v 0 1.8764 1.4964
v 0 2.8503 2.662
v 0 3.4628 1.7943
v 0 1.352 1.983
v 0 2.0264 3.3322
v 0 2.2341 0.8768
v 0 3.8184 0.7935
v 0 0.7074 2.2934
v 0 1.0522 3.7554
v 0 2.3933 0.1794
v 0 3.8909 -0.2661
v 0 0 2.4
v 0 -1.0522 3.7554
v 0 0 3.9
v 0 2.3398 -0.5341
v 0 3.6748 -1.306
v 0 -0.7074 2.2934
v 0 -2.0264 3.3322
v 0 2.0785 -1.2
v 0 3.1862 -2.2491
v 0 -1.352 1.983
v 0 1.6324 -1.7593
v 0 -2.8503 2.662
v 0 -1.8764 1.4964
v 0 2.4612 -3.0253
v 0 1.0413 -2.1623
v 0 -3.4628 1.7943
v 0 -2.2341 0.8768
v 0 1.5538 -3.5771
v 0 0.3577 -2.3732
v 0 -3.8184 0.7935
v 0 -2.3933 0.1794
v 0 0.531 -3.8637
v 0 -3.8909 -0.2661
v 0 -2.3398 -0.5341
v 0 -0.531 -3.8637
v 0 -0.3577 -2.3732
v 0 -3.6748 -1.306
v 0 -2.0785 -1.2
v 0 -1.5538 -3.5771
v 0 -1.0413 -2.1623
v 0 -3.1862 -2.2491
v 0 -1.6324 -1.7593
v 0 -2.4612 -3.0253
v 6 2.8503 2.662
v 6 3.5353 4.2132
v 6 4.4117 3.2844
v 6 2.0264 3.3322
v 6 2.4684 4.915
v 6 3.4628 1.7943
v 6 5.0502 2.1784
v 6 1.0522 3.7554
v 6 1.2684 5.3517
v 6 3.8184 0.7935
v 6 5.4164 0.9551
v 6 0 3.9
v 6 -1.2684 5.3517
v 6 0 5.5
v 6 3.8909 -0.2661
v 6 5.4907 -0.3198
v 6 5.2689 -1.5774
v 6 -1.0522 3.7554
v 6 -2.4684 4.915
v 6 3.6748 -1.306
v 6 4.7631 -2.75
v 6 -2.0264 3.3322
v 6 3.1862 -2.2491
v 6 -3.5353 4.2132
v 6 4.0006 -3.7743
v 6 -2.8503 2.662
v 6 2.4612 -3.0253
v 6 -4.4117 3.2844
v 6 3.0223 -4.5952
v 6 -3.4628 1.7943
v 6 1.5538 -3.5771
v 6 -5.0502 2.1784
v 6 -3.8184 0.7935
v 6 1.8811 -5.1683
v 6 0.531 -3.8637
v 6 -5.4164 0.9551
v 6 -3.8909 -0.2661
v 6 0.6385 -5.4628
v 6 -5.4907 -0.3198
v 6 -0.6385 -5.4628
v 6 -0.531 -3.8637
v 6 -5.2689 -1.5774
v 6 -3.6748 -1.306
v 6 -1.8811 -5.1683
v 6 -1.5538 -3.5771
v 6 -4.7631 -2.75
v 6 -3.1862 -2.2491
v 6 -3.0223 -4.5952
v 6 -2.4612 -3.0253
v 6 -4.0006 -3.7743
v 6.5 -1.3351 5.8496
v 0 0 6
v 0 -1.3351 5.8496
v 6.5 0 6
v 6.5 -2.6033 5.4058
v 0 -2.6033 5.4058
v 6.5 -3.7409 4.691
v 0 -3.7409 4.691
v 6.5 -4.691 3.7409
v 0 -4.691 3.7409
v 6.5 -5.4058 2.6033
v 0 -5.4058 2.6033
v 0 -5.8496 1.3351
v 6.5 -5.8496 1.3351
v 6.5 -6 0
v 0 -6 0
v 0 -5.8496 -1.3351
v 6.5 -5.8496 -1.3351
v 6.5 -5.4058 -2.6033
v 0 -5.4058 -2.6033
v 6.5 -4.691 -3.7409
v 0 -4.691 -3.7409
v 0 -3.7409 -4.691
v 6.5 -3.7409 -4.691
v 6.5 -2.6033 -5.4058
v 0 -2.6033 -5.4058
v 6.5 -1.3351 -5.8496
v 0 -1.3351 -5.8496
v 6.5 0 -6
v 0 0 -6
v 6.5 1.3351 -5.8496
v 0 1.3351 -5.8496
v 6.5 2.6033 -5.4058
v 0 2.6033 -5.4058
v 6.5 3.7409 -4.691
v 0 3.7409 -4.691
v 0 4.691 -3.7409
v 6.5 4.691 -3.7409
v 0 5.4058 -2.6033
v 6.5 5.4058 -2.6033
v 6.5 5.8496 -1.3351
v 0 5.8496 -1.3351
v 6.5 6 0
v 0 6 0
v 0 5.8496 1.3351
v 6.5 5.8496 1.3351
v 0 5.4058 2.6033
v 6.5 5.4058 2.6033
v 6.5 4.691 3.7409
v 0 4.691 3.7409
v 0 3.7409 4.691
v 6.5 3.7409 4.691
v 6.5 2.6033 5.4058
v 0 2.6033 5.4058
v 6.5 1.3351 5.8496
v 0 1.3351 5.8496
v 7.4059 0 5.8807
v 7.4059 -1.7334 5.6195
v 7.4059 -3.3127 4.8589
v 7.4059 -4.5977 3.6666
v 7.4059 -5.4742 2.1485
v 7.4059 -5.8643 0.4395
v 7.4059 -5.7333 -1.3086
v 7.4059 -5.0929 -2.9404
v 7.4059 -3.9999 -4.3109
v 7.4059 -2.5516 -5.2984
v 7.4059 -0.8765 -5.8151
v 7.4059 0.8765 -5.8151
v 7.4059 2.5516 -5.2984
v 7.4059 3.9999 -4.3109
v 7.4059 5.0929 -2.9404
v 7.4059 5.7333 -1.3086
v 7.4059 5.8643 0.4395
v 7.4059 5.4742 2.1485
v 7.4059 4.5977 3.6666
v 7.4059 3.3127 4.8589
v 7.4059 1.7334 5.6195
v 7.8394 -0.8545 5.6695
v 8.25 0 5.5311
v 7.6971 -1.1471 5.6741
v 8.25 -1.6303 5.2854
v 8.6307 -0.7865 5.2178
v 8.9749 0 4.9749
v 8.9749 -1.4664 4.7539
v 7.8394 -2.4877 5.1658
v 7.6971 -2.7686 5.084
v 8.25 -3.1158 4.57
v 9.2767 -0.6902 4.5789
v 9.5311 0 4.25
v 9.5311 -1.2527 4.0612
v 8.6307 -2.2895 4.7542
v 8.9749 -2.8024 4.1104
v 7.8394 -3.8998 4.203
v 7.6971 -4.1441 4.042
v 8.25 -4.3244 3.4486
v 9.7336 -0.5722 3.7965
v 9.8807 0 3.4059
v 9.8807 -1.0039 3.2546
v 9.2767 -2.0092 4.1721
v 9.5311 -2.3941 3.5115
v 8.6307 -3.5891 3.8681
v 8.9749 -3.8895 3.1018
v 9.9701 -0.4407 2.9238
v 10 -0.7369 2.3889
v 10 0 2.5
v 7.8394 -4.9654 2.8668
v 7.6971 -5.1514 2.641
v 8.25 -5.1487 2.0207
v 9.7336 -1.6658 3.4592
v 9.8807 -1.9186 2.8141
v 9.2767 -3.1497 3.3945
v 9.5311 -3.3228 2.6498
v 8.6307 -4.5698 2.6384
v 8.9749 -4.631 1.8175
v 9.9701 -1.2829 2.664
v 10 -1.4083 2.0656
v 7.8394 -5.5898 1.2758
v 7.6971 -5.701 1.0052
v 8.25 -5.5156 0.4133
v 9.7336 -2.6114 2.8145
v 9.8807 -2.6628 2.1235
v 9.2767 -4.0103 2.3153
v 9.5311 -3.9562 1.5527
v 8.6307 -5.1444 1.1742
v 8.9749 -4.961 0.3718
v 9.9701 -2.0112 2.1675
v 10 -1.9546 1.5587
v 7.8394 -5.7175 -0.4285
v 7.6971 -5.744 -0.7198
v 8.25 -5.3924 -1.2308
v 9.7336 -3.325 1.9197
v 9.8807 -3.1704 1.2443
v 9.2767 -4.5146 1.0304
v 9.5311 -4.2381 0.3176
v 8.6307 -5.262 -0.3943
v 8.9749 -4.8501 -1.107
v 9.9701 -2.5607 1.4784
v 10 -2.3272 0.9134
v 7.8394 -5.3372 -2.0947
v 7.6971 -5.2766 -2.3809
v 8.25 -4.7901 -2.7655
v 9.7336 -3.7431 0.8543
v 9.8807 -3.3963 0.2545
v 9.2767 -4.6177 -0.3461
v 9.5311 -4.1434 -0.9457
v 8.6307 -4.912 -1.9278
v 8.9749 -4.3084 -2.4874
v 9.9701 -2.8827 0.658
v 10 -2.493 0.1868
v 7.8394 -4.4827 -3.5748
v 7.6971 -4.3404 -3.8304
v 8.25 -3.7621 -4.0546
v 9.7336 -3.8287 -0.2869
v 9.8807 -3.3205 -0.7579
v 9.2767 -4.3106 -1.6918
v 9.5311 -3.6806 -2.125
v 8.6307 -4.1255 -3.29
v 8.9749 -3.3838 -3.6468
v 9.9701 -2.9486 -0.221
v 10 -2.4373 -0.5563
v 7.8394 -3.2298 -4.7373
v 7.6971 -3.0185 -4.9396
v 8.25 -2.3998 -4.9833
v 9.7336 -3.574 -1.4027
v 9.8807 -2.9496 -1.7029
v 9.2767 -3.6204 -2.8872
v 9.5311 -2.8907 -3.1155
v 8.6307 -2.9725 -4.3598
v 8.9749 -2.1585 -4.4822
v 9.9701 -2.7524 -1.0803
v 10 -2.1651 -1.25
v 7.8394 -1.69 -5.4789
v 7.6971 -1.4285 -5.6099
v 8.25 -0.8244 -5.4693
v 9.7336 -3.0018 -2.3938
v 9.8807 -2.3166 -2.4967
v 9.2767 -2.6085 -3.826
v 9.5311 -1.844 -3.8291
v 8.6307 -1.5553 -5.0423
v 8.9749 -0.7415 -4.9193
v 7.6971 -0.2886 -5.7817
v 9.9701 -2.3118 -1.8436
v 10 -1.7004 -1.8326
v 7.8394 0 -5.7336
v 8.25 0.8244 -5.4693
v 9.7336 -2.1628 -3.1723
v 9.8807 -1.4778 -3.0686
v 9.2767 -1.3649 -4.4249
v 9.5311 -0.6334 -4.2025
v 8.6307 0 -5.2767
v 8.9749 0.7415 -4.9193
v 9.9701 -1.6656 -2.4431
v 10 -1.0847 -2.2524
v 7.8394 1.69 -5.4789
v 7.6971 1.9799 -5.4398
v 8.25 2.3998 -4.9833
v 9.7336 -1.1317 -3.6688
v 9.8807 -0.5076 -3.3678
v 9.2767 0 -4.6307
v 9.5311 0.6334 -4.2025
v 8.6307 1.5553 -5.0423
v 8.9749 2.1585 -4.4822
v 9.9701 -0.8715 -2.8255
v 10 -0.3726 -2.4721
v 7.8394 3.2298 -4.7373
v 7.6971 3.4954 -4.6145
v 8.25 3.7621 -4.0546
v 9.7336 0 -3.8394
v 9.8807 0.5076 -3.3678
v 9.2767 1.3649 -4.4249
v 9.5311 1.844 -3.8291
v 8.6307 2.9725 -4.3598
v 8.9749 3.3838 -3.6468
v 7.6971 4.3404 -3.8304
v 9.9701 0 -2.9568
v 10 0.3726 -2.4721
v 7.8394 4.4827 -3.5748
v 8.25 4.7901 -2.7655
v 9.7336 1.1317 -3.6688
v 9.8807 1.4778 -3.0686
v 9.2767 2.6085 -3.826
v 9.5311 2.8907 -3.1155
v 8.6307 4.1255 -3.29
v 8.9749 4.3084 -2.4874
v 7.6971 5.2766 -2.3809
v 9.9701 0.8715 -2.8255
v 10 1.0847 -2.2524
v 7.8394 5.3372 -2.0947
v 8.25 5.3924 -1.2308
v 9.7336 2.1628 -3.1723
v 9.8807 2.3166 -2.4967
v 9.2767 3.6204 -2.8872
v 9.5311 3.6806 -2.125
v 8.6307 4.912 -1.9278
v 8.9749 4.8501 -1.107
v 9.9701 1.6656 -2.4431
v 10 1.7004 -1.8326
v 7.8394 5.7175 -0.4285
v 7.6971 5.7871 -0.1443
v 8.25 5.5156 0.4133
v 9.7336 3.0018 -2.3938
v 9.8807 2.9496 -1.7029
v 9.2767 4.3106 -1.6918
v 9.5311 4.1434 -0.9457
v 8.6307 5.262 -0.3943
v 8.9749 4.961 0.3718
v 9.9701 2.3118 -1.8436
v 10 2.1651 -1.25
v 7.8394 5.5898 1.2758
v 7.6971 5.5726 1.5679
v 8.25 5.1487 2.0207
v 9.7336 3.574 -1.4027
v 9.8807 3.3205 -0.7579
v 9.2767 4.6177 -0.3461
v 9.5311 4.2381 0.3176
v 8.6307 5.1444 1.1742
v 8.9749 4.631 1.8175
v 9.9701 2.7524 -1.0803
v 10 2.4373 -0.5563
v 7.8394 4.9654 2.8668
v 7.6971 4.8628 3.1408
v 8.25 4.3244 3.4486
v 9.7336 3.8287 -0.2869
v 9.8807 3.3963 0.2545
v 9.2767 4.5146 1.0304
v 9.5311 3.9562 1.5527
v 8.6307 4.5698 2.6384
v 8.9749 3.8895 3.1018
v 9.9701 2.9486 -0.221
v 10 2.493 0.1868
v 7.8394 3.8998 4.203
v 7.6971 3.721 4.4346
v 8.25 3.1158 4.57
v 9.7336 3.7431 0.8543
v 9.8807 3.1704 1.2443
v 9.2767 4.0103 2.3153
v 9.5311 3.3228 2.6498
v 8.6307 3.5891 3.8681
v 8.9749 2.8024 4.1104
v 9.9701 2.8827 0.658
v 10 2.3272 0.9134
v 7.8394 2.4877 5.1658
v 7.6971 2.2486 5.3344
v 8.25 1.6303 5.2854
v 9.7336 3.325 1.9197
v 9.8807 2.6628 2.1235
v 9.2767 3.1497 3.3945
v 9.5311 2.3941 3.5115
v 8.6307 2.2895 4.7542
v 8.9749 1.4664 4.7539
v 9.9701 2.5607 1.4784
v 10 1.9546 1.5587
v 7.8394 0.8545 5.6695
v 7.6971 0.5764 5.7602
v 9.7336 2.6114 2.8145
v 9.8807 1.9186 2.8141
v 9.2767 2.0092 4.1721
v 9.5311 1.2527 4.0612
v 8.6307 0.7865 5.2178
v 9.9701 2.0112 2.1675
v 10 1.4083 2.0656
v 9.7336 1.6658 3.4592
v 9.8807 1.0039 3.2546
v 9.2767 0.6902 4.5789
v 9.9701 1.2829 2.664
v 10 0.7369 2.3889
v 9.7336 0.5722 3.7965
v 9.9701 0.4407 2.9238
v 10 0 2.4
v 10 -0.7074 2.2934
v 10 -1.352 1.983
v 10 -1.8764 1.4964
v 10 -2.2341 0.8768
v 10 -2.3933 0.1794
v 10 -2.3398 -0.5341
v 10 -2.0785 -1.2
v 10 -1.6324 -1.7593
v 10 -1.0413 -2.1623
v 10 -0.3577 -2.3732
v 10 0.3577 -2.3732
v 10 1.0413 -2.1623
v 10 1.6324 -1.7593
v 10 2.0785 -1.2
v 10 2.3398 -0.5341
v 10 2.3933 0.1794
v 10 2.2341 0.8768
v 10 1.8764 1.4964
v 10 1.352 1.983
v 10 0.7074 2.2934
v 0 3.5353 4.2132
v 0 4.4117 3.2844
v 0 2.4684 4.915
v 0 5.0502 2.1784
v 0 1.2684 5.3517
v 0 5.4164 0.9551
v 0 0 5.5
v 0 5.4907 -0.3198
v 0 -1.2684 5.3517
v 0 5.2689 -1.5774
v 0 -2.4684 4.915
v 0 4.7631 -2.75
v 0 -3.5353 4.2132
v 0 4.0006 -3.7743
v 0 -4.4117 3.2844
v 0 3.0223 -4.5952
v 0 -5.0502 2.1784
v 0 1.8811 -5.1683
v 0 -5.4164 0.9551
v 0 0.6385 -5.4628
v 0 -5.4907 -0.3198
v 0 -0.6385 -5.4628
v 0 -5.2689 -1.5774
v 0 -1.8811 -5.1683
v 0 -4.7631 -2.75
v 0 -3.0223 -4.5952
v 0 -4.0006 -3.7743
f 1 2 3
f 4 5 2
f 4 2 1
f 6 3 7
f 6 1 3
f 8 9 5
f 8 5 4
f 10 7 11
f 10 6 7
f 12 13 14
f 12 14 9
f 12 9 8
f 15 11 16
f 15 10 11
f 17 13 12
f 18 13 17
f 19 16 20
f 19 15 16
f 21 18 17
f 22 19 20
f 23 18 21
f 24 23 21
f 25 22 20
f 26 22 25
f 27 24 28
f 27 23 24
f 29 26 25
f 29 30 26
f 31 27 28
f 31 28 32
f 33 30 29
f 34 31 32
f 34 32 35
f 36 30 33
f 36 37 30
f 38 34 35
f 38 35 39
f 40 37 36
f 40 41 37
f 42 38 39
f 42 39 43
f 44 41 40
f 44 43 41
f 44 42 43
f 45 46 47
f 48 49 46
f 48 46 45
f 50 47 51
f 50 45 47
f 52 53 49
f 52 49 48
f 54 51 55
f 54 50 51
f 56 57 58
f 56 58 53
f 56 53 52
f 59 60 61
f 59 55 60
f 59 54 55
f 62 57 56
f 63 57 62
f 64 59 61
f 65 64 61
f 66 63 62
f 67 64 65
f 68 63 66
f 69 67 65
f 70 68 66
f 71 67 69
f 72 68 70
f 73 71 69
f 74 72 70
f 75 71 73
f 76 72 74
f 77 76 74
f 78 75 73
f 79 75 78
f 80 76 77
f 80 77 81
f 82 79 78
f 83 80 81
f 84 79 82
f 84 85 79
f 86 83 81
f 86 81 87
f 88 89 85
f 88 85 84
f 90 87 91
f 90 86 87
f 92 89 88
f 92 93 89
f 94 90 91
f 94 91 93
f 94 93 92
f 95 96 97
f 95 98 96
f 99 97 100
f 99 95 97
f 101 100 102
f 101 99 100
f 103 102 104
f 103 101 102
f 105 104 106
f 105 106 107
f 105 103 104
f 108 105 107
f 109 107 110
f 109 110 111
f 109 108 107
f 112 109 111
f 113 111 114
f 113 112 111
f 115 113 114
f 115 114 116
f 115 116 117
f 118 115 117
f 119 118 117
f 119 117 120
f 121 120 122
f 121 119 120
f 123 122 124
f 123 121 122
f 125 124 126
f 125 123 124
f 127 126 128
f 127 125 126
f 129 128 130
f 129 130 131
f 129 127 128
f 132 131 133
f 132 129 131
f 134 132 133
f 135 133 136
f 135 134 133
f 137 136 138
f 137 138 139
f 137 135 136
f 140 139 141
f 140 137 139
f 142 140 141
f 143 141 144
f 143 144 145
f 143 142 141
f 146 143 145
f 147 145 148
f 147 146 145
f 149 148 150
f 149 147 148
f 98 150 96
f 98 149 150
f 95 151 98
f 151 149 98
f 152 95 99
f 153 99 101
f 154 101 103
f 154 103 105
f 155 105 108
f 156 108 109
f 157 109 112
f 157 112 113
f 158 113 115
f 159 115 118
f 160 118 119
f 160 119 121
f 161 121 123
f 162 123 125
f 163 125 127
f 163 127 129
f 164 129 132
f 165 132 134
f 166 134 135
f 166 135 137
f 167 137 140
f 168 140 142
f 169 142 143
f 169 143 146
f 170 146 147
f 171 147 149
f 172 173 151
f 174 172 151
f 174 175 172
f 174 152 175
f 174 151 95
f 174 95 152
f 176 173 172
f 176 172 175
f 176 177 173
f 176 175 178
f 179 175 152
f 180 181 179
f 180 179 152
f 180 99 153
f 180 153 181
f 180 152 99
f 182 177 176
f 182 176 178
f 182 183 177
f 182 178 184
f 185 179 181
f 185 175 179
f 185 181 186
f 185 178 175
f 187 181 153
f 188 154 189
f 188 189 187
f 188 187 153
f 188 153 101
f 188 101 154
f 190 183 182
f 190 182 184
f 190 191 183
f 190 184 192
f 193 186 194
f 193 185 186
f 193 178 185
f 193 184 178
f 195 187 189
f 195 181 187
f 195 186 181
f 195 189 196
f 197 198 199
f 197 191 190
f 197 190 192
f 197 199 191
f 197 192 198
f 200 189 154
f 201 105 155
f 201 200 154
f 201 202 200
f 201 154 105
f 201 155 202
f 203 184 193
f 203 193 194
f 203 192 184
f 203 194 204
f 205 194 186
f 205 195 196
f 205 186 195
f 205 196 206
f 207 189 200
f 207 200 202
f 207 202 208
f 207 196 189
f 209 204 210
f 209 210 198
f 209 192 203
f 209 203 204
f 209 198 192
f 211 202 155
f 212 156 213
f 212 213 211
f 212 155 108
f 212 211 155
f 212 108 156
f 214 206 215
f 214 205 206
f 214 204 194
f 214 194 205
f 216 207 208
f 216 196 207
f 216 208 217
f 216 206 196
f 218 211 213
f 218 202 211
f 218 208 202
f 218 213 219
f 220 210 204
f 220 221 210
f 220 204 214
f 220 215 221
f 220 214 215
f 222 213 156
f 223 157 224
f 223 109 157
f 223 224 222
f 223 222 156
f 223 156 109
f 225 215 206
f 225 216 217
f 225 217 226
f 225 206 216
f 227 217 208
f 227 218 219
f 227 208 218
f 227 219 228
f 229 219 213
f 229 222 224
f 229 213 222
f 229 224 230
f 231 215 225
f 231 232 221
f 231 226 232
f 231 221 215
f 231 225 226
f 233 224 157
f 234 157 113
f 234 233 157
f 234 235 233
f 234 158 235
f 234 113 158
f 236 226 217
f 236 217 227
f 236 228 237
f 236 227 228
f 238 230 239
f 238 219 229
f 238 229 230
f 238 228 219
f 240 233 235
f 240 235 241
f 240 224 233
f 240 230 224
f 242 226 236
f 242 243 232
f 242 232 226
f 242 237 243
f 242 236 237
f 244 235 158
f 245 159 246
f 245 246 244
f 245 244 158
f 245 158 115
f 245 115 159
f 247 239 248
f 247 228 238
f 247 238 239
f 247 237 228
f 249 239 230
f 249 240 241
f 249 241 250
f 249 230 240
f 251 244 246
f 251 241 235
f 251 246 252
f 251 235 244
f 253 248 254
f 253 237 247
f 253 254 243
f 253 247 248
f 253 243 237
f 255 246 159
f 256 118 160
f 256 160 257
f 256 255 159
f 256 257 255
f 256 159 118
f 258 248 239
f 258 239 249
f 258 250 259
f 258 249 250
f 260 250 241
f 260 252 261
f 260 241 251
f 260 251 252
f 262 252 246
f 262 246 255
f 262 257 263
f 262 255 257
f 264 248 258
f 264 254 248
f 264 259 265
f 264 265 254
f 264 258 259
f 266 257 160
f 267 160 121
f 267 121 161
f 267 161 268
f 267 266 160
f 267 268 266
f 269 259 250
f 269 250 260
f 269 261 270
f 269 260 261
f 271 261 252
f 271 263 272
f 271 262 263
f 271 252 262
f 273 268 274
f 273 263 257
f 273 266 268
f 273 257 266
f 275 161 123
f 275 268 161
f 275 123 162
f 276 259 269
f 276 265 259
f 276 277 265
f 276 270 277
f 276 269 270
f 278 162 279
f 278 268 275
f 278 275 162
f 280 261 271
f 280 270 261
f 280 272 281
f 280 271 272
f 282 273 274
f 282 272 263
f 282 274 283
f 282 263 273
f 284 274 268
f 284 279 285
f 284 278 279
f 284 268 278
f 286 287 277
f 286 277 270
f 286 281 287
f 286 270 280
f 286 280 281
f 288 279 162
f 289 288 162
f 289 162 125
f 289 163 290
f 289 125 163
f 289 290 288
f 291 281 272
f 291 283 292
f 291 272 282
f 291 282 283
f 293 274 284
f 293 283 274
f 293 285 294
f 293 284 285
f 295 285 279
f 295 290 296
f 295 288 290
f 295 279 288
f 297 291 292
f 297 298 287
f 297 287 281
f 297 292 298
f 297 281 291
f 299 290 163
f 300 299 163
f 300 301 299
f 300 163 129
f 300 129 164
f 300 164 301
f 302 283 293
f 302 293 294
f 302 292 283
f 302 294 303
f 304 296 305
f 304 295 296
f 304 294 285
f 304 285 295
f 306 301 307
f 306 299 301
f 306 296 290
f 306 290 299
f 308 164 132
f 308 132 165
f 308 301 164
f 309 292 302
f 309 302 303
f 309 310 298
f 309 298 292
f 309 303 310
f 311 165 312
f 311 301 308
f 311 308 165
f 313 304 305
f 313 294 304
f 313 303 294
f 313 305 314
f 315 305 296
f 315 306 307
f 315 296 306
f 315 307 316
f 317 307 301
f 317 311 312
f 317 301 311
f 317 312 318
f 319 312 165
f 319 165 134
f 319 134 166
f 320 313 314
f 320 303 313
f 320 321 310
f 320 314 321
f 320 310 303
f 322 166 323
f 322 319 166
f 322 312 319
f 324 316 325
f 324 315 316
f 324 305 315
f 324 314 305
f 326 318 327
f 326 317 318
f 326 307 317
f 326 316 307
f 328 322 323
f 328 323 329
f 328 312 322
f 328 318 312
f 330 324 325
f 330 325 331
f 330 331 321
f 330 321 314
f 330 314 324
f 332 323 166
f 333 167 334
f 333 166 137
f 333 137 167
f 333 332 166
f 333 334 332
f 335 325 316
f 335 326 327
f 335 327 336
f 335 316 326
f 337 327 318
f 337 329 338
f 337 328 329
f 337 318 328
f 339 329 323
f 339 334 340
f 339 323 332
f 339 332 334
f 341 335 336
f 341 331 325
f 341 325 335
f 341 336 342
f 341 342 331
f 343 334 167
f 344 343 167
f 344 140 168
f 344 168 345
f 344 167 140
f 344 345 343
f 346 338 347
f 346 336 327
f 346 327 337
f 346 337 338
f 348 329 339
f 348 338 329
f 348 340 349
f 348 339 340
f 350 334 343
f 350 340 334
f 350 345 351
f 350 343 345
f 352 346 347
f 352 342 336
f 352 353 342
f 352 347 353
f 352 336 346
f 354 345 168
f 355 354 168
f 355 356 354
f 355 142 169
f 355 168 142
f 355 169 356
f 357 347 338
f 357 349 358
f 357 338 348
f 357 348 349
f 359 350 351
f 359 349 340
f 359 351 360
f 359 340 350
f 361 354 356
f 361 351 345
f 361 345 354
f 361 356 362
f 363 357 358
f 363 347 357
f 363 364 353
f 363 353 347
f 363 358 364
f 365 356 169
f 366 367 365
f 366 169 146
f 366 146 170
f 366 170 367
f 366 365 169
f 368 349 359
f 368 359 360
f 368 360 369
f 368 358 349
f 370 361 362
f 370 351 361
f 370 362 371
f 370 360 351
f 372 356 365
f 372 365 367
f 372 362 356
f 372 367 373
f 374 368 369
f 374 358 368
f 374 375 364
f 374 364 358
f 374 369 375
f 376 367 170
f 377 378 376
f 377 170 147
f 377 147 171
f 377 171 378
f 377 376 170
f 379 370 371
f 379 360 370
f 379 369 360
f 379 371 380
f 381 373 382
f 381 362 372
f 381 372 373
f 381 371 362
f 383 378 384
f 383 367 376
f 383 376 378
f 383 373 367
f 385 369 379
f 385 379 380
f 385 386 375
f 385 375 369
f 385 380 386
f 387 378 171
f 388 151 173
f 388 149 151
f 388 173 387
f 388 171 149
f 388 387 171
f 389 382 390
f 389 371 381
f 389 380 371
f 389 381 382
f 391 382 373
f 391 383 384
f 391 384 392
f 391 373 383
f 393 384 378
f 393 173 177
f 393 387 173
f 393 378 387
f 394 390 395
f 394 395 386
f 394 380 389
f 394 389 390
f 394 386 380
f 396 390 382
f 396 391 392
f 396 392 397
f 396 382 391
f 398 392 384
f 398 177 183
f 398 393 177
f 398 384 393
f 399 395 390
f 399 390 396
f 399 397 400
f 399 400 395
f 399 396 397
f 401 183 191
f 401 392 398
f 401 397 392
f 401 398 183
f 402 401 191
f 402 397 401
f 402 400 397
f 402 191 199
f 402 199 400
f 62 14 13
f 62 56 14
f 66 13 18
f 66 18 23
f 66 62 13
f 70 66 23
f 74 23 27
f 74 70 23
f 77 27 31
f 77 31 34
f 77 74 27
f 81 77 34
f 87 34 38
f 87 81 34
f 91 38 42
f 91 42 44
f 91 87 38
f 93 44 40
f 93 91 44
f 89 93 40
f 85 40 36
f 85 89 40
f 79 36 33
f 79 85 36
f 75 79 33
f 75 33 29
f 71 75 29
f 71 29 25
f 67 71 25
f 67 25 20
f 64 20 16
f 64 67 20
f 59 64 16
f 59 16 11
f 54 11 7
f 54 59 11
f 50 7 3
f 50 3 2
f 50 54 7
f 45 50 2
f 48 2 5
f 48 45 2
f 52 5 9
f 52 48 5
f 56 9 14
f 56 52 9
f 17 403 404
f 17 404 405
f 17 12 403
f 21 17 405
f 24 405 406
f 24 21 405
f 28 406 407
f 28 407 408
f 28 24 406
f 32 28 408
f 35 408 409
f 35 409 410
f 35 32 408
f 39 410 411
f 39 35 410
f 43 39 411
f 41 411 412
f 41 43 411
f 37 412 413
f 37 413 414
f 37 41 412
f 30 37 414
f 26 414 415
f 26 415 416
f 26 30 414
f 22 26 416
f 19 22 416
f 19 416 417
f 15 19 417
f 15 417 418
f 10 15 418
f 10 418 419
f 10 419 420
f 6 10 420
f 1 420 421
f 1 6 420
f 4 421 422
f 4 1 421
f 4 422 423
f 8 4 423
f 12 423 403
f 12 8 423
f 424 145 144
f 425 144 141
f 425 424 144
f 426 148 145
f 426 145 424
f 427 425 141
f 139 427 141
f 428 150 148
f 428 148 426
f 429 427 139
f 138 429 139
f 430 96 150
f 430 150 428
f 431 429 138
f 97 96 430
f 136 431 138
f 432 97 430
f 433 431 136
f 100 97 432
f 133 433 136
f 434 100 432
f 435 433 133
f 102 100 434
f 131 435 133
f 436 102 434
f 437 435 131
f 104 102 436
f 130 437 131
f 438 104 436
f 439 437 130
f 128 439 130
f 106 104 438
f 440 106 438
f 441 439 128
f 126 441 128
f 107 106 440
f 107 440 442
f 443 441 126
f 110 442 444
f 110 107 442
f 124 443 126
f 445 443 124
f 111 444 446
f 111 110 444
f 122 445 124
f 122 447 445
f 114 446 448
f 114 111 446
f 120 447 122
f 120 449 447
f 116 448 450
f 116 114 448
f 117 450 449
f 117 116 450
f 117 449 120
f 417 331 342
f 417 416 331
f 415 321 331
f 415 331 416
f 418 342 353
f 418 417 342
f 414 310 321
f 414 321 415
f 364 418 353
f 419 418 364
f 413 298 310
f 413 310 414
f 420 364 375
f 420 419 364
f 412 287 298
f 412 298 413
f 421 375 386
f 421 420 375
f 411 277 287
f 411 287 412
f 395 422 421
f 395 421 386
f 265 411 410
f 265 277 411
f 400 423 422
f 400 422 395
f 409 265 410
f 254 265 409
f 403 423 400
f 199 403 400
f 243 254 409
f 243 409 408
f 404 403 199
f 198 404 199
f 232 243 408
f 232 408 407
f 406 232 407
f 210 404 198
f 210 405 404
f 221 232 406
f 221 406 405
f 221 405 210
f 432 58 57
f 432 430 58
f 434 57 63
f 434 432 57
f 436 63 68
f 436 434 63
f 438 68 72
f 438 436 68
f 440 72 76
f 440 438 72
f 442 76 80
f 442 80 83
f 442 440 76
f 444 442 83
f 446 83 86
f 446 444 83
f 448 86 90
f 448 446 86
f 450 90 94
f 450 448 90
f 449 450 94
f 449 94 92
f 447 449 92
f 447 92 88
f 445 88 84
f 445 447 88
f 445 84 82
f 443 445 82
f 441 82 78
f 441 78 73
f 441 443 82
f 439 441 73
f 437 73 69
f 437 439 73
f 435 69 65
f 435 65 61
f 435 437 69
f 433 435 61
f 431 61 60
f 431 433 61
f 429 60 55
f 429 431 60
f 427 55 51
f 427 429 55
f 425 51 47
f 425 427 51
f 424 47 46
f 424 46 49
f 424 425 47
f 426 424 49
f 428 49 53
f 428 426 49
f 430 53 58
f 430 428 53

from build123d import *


with BuildPart() as part:
    # Sketch1 → Revolve1 (revolve)
    with BuildSketch(Plane(origin=(0, 0, 0), x_dir=(-1, 0, 0), z_dir=(0, 1, 0))):
        with BuildLine():
            Line((-10, 2.4), (0, 2.4))
            Line((0, 2.4), (0, 3.9))
            Line((0, 3.9), (-6, 3.9))
            Line((-6, 3.9), (-6, 5.5))
            Line((-6, 5.5), (0, 5.5))
            Line((0, 5.5), (0, 6))
            Line((0, 6), (-6.5, 6))
            ThreePointArc((-6.5, 6), (-8.974873734, 4.974873734), (-10, 2.5))
            Line((-10, 2.5), (-10, 2.4))
        make_face()
    revolve(axis=Axis((0, 0, 0), (1, 0, 0)))


solid = part.part
